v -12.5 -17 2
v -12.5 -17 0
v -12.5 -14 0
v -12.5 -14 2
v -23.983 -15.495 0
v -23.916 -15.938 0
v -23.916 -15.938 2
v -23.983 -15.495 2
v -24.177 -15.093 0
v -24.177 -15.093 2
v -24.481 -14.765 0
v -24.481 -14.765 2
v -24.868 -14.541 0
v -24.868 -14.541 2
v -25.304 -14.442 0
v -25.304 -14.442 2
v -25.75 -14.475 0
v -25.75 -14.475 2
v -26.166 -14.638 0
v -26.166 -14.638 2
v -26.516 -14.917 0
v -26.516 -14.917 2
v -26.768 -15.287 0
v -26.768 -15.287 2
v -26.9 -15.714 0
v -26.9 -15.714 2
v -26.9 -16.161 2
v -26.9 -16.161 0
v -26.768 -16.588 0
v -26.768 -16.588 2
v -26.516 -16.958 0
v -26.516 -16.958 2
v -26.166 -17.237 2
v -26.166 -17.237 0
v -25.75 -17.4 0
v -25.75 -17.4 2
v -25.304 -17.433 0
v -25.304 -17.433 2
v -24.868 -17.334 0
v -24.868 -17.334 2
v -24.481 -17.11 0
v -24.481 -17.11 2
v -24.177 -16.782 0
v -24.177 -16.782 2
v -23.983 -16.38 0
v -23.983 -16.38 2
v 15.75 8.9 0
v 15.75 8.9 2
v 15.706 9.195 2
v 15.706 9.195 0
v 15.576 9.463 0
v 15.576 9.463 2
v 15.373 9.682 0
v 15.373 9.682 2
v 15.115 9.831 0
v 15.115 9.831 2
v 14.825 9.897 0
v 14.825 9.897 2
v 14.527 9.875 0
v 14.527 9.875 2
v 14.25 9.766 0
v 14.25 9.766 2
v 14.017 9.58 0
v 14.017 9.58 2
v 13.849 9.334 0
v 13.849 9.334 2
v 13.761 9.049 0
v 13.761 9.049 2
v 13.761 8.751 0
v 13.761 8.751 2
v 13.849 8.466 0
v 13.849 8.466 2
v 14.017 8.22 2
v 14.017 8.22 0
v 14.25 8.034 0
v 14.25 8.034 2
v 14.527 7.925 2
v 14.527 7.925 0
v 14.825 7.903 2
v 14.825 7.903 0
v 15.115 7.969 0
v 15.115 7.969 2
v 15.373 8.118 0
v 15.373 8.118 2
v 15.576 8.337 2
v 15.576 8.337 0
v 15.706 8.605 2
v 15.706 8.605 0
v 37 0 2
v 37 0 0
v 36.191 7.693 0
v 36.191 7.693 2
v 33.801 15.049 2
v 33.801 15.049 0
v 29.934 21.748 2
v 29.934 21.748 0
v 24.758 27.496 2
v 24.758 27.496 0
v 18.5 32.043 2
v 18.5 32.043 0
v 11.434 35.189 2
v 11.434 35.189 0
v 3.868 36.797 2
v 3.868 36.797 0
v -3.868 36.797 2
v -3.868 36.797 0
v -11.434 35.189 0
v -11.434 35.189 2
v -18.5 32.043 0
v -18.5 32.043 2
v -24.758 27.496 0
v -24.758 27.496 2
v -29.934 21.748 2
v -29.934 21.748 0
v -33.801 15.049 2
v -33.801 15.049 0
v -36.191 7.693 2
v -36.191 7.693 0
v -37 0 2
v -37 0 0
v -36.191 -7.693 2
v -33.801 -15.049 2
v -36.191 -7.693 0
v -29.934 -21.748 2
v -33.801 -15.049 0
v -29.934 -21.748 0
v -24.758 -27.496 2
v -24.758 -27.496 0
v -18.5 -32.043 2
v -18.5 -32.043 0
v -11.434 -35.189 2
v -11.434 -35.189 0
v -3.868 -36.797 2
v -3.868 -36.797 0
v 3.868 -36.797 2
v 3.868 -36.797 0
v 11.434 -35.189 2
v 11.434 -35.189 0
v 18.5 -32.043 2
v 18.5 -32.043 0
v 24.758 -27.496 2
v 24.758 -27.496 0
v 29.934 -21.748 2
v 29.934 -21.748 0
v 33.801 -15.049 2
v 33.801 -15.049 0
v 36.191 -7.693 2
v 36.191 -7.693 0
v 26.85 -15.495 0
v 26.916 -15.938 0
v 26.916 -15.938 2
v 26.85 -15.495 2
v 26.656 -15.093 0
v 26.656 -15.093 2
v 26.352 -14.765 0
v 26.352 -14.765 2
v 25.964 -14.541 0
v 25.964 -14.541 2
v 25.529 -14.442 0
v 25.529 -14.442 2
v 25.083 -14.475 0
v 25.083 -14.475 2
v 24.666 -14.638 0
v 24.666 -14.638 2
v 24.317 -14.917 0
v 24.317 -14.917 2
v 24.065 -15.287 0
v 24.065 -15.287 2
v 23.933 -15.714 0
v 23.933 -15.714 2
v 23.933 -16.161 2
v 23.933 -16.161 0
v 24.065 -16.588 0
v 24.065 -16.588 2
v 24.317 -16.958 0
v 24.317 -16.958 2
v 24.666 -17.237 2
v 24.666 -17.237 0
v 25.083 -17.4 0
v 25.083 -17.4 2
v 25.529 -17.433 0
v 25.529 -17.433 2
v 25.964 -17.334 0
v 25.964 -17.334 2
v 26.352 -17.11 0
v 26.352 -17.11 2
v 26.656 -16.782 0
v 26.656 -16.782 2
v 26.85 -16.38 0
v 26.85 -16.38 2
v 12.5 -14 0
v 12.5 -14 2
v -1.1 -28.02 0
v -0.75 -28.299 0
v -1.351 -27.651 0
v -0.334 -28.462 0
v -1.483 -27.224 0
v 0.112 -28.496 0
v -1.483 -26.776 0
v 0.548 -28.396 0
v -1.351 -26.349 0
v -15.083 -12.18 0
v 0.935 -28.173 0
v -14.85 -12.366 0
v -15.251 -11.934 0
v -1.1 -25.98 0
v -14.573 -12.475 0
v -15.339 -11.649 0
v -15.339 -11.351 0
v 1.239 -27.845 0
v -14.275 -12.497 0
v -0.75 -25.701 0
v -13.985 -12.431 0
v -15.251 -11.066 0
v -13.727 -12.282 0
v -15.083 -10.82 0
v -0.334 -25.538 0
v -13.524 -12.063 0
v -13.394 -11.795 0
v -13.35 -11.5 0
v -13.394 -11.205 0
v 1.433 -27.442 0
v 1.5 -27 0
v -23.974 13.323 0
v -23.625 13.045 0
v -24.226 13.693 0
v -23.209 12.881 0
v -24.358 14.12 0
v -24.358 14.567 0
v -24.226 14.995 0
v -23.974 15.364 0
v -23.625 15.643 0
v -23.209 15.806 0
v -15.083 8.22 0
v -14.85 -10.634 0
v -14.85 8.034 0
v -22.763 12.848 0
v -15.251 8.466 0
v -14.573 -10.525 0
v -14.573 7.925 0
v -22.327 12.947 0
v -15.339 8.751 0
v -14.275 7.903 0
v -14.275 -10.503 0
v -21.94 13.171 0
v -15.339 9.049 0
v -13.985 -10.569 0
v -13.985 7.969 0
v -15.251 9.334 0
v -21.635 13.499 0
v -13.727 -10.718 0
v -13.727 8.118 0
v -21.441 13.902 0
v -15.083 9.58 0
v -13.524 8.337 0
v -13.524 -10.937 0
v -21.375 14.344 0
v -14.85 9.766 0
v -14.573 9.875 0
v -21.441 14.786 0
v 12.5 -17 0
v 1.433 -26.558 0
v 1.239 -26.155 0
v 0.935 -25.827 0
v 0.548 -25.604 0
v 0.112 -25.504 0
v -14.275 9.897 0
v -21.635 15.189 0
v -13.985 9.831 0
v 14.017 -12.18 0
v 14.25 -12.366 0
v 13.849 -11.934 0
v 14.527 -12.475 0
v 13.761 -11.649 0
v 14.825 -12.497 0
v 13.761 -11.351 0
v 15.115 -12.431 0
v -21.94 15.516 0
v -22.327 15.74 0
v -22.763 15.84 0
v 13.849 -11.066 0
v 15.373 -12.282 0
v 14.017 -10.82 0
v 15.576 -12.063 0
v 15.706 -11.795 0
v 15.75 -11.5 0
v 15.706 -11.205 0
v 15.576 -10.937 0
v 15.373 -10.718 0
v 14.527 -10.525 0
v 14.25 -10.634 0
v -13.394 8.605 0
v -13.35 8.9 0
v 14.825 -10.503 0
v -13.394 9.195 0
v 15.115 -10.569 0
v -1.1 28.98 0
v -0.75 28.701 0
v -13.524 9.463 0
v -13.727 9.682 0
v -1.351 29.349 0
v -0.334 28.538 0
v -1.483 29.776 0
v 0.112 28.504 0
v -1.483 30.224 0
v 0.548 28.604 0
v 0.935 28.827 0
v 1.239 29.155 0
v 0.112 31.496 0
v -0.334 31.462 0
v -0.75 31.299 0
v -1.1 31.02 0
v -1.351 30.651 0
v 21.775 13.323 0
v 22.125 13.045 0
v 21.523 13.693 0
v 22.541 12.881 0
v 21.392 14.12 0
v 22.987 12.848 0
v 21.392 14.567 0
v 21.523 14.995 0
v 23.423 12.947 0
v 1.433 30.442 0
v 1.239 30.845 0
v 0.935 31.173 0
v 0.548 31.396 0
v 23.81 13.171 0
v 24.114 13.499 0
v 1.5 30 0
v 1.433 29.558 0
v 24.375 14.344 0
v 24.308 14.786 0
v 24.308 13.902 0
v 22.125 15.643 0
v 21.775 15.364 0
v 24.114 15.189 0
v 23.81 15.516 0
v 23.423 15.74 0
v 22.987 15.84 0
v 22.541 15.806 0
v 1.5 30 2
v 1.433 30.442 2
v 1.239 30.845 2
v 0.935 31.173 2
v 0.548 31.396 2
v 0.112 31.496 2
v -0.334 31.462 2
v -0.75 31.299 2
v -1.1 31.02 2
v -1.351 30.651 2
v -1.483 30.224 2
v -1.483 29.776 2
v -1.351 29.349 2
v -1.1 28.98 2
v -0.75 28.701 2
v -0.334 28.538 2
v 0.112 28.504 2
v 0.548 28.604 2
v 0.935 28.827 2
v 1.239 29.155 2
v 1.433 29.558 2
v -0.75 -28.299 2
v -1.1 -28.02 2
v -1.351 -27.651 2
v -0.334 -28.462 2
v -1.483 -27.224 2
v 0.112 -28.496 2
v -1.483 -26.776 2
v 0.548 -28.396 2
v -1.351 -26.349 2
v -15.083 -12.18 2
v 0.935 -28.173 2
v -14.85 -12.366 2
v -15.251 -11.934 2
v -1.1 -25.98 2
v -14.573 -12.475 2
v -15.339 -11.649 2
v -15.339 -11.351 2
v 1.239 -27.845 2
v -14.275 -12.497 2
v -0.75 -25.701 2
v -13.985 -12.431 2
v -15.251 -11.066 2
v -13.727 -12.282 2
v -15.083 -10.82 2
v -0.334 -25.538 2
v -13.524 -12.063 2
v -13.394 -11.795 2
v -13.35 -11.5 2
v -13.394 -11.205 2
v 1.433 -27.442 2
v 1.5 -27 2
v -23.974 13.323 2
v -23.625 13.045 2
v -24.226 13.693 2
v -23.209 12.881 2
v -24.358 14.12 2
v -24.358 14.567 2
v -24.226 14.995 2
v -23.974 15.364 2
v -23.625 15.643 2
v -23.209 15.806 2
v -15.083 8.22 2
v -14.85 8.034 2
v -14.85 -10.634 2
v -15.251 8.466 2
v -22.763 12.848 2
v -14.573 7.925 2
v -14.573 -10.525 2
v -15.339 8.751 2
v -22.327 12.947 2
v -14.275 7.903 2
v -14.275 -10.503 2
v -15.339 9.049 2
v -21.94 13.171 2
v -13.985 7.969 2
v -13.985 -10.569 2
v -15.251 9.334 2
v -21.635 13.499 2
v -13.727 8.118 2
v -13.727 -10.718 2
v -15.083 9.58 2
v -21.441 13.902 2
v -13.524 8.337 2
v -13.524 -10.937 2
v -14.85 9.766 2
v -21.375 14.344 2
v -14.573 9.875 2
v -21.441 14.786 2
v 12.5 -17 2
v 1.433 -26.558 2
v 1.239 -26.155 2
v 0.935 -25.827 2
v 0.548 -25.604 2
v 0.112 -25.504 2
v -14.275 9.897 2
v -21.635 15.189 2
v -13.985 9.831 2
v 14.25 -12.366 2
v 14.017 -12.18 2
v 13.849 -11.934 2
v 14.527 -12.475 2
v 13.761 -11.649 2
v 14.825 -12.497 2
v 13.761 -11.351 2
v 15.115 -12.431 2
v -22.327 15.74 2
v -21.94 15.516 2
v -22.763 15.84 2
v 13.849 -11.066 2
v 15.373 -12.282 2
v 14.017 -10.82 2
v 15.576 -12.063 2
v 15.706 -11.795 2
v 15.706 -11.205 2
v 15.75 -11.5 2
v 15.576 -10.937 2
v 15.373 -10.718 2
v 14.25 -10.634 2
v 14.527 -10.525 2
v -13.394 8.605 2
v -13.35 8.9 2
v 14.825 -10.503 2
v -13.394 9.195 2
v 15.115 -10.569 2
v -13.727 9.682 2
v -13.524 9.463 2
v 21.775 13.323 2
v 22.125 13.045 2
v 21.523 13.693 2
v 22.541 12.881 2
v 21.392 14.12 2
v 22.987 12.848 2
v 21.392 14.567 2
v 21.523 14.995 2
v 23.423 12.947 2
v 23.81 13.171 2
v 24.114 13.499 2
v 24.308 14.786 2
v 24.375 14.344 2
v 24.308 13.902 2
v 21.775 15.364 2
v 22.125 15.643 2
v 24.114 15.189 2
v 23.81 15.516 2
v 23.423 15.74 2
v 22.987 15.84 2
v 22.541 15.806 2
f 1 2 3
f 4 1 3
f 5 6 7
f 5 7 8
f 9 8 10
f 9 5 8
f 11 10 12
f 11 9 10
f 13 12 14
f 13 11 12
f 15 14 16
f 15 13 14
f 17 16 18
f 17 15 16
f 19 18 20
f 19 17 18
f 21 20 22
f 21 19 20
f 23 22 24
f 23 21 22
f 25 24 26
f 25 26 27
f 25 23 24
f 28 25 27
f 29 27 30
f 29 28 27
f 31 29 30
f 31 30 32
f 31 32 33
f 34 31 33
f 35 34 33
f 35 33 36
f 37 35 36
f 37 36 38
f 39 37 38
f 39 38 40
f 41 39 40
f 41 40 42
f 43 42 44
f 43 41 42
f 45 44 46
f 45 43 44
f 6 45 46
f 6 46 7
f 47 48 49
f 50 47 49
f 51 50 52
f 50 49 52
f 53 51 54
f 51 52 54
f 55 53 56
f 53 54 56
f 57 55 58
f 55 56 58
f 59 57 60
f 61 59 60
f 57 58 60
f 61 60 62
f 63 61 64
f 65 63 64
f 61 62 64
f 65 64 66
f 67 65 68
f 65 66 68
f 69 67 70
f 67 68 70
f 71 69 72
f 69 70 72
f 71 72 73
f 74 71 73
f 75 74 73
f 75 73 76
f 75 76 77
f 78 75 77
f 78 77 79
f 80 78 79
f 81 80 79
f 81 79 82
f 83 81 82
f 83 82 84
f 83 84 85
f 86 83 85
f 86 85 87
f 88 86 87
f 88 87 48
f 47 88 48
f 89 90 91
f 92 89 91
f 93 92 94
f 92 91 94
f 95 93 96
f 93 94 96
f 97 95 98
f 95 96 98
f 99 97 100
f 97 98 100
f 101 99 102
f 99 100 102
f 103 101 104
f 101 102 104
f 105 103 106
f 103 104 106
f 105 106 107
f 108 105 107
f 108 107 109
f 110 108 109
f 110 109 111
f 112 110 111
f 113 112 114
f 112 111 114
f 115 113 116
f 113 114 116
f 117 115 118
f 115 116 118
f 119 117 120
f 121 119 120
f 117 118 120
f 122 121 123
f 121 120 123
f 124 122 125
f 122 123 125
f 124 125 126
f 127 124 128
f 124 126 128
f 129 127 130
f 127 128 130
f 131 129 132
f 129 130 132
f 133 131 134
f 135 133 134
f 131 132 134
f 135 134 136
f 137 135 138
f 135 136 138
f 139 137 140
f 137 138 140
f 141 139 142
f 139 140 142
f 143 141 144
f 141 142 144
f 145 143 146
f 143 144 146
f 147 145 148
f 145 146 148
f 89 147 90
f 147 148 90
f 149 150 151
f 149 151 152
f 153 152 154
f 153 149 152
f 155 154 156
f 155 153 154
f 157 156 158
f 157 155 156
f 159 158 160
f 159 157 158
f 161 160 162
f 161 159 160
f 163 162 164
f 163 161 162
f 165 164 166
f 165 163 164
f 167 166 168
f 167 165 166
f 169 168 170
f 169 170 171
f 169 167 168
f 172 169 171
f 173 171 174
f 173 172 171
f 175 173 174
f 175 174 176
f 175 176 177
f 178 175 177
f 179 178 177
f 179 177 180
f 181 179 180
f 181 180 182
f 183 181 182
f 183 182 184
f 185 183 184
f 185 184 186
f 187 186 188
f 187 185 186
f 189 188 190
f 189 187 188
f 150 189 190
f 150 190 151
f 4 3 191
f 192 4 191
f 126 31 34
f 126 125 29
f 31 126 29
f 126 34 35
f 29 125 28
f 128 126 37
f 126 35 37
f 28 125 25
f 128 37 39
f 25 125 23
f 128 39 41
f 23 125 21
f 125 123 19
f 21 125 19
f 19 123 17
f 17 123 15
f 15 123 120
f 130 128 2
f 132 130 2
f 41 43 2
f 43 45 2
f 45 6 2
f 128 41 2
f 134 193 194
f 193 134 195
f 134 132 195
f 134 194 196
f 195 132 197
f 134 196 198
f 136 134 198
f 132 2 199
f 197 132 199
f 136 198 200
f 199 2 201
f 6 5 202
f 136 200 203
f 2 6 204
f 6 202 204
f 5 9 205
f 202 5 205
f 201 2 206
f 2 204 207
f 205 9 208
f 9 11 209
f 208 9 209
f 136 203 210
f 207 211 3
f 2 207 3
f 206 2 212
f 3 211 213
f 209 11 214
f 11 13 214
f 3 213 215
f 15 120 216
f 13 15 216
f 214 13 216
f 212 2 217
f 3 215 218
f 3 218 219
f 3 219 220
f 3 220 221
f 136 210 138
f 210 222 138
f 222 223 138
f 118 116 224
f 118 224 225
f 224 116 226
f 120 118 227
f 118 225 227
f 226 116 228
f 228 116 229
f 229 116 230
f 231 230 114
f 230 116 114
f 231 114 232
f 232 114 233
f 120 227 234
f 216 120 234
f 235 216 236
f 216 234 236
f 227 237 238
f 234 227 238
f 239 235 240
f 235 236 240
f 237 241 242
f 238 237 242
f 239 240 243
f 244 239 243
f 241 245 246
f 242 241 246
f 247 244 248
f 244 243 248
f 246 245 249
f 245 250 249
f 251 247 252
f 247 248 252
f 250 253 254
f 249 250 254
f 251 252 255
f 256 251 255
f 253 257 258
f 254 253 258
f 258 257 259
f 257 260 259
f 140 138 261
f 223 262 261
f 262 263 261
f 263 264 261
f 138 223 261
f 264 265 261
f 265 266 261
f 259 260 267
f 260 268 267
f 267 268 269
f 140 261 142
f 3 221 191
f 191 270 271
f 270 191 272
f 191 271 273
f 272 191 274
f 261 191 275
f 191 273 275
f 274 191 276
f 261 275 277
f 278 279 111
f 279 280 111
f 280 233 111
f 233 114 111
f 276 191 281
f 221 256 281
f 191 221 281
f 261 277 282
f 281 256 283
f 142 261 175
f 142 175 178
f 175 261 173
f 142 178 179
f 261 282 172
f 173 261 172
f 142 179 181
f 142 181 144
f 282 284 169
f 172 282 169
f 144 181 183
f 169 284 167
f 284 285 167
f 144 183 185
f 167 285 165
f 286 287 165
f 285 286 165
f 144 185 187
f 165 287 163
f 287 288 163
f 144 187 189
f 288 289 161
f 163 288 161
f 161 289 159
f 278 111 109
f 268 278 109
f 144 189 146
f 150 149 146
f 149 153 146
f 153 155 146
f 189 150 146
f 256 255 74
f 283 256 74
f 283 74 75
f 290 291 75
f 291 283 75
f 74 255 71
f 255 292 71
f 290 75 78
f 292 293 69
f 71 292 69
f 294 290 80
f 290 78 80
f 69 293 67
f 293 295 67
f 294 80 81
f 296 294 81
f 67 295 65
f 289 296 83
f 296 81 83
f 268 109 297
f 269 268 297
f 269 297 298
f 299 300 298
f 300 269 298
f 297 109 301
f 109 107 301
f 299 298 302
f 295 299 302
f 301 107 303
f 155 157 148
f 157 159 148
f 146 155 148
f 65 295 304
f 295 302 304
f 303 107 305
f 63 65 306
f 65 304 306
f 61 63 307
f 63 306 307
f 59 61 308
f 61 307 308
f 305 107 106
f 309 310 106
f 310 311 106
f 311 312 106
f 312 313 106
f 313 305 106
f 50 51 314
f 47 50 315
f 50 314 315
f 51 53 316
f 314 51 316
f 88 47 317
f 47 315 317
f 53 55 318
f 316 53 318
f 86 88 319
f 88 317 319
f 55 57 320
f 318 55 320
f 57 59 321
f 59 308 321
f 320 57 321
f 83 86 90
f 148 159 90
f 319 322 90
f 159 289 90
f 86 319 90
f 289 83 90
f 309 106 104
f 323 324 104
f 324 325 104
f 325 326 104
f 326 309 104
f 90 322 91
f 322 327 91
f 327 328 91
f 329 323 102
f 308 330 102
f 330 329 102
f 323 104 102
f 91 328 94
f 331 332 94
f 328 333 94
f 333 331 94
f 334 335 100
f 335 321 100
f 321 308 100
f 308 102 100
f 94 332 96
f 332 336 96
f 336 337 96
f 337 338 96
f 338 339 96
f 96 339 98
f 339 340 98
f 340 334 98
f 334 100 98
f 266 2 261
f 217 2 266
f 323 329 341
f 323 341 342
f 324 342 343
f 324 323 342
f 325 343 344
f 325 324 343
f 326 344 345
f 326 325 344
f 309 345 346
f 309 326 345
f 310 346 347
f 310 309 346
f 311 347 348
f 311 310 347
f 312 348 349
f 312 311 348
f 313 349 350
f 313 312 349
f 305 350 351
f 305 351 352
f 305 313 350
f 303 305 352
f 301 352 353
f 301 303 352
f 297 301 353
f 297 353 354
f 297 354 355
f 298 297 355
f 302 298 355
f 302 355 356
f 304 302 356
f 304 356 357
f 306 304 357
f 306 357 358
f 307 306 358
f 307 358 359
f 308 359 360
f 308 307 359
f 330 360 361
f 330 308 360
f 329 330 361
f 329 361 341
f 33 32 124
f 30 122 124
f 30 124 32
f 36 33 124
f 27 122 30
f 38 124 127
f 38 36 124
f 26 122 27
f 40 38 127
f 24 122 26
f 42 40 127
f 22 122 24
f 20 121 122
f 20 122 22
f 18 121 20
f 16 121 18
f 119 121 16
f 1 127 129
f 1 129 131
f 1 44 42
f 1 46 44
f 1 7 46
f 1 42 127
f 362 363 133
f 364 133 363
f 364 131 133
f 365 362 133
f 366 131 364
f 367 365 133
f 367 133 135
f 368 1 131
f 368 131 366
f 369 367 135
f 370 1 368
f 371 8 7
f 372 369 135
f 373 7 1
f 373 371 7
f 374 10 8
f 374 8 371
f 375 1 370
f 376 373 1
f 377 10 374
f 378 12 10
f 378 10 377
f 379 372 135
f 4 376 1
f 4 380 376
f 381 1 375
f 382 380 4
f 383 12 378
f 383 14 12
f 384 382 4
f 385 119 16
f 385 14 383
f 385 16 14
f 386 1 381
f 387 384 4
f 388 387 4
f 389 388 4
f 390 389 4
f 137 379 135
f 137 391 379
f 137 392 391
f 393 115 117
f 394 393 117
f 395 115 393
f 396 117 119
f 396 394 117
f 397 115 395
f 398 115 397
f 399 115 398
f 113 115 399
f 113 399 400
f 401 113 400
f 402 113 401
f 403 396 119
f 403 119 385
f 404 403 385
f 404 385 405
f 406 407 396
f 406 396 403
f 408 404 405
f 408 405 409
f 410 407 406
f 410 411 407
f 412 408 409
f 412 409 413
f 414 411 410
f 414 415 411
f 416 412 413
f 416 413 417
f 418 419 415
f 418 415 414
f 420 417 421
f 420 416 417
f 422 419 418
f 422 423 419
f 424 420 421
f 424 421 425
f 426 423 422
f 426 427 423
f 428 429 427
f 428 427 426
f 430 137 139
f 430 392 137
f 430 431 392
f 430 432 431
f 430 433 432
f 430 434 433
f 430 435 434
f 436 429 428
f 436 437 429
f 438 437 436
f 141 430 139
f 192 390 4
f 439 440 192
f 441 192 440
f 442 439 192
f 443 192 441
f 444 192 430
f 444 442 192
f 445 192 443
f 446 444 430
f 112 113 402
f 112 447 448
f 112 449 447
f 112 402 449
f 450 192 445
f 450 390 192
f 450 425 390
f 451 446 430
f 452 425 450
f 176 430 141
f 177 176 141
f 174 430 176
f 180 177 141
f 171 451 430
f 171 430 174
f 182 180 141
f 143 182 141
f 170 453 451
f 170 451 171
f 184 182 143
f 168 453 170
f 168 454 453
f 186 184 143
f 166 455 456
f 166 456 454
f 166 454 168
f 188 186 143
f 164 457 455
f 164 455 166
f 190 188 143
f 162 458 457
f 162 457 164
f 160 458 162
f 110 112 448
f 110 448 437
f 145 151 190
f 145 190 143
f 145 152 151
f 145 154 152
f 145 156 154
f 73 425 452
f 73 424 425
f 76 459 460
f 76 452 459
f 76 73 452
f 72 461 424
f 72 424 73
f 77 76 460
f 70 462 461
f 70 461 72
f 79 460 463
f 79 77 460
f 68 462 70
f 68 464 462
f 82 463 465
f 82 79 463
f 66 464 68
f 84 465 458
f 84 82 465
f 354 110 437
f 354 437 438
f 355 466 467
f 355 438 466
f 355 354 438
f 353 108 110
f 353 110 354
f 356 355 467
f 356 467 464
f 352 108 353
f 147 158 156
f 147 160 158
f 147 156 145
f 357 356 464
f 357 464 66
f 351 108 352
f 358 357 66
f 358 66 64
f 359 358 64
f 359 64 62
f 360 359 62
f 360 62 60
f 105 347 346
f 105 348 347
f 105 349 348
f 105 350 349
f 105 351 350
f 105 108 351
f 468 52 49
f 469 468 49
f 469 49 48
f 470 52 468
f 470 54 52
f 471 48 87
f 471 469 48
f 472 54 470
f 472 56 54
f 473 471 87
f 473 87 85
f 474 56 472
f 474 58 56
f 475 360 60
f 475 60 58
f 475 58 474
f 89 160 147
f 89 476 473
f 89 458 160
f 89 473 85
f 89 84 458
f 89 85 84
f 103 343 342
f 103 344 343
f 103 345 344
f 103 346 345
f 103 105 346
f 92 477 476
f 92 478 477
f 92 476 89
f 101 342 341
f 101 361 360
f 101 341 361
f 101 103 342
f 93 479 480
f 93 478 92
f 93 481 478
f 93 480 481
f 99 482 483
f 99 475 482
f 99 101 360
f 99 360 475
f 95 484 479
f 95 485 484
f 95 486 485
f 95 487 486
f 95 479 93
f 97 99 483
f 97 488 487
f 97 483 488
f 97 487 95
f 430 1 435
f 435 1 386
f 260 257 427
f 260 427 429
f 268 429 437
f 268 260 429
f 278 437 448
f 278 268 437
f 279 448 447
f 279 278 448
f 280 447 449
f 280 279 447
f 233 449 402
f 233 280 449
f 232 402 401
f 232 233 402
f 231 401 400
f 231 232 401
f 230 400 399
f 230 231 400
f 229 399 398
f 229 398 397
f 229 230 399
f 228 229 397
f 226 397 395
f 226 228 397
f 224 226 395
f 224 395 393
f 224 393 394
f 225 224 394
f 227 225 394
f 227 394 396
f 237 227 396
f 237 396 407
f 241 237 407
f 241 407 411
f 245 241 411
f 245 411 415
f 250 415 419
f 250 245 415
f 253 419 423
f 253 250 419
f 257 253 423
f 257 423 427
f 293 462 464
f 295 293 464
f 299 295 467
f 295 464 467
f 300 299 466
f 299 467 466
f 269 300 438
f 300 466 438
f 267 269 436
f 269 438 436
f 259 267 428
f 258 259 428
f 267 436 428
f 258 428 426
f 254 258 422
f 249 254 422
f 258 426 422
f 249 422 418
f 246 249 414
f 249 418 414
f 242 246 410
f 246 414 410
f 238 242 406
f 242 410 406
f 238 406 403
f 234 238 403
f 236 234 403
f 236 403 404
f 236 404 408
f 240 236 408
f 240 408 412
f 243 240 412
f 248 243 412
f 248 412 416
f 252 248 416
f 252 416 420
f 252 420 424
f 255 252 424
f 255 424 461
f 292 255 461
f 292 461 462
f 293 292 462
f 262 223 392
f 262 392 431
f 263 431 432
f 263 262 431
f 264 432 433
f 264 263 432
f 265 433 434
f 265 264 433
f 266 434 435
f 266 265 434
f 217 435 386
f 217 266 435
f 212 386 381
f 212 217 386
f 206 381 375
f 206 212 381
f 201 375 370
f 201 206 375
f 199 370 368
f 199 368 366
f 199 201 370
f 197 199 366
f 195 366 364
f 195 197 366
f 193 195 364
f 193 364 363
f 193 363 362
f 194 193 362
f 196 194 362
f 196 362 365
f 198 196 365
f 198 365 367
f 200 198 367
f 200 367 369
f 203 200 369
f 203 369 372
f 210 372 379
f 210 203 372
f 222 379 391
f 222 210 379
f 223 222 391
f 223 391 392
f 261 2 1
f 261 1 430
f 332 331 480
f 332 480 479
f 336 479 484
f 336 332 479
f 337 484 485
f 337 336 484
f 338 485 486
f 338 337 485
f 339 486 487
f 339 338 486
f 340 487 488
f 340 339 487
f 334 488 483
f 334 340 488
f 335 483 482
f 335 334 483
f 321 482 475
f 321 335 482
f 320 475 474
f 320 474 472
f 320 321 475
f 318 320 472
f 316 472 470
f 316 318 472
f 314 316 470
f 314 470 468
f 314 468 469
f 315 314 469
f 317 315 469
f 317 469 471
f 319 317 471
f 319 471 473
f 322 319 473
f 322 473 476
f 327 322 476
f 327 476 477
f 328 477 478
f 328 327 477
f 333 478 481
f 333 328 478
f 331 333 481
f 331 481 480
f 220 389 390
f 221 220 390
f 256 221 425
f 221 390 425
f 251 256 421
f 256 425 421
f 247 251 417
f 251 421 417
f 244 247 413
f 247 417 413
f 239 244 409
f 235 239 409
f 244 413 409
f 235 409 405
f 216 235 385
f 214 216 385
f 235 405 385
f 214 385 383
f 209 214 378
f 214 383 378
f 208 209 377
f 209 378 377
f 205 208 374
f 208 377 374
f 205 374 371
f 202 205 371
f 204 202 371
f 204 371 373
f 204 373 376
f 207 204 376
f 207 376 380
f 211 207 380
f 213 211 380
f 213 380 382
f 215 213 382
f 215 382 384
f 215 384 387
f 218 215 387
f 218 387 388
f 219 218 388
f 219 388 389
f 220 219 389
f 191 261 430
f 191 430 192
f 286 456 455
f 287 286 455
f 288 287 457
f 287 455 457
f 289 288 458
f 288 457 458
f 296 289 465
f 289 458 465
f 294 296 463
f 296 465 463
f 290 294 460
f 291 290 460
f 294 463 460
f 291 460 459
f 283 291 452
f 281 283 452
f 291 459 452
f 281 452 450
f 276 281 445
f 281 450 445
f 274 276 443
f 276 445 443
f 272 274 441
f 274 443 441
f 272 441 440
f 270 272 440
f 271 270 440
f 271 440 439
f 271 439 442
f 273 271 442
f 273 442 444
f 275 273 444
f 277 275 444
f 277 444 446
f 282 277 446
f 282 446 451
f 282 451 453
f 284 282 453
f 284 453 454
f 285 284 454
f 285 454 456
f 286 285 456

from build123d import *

# Parameters (mm, degrees)
ESQUISSE1_R             = 37
ESQUISSE1_R_2           = 1.5
ESQUISSE1_W             = 25
ESQUISSE1_H             = 3
BOSS_EXTRU_1_DEPTH      = 2
BOSS_EXTRU_2_DEPTH      = 15
ESQUISSE3_W             = 2
ESQUISSE3_H             = 28.4
BOSS_EXTRU_3_DEPTH      = 2.25
ESQUISSE5_W             = 2
ESQUISSE5_H             = 24.4
BOSS_EXTRU_4_DEPTH      = 2.25
ESQUISSE7_W             = 33.1
ESQUISSE7_H             = 28.4
BOSS_EXTRU_5_DEPTH      = 1
ESQUISSE8_W             = 15
ESQUISSE8_H             = 15
ENL_V_MAT_EXTRU_1_DEPTH = 3
ESQUISSE9_W             = 21
ESQUISSE9_H             = 2.5
ENL_V_MAT_EXTRU_2_DEPTH = 3
ESQUISSE10_R            = 1
ENL_V_MAT_EXTRU_3_DEPTH = 19
ESQUISSE11_W            = 33.1
ESQUISSE11_H            = 28.4
ENL_V_MAT_EXTRU_4_DEPTH = 15


with BuildPart() as part:
    # Esquisse1 → Boss.-Extru.1 (new body)
    with BuildSketch(Plane.XY):
        Circle(ESQUISSE1_R)
        with Locations((0, 30)):
            Circle(ESQUISSE1_R_2, mode=Mode.SUBTRACT)
        with Locations((-22.874807889, 14.34375)):
            Circle(ESQUISSE1_R_2, mode=Mode.SUBTRACT)
        with Locations((-25.416453209, -15.9375)):
            Circle(ESQUISSE1_R_2, mode=Mode.SUBTRACT)
        with Locations((0, -27)):
            Circle(ESQUISSE1_R_2, mode=Mode.SUBTRACT)
        with Locations((25.416453209, -15.9375)):
            Circle(ESQUISSE1_R_2, mode=Mode.SUBTRACT)
        with Locations((22.874807889, 14.34375)):
            Circle(ESQUISSE1_R_2, mode=Mode.SUBTRACT)
        with Locations((0, -15.5)):
            Rectangle(ESQUISSE1_W, ESQUISSE1_H, mode=Mode.SUBTRACT)
    extrude(amount=BOSS_EXTRU_1_DEPTH)

    # Esquisse2 → Boss.-Extru.2 (add)
    with BuildSketch(Plane(origin=(0, 0, 0), x_dir=(-1, 0, 0), z_dir=(0, 0, -1))):
        Polygon((-16.75, 14.9), (-12.75, 14.9), (-12.75, -9.5), (12.35, -9.5), (12.35, 14.9), (16.35, 14.9), (16.35, -13.5), (-16.75, -13.5), align=None)
    extrude(amount=BOSS_EXTRU_2_DEPTH)

    # Esquisse3 → Boss.-Extru.3 (add)
    with BuildSketch(Plane(origin=(-12.35, 0, 0), x_dir=(0, 0, -1), z_dir=(1, 0, 0))):
        with Locations((9.625, 0.7)):
            Rectangle(ESQUISSE3_W, ESQUISSE3_H)
        with Locations((6.625, 0.7)):
            Rectangle(ESQUISSE3_W, ESQUISSE3_H)
    extrude(amount=BOSS_EXTRU_3_DEPTH)

    # Esquisse5 → Boss.-Extru.4 (add)
    with BuildSketch(Plane.ZY.offset(-12.75)):
        with Locations((-9.625, 2.7)):
            Rectangle(ESQUISSE5_W, ESQUISSE5_H)
        with Locations((-6.625, 2.7)):
            Rectangle(ESQUISSE5_W, ESQUISSE5_H)
    extrude(amount=BOSS_EXTRU_4_DEPTH)

    # Esquisse7 → Boss.-Extru.5 (add)
    with BuildSketch(Plane(origin=(0, 0, -15), x_dir=(-1, 0, 0), z_dir=(0, 0, -1))):
        with Locations((-0.2, 0.7)):
            Rectangle(ESQUISSE7_W, ESQUISSE7_H)
    extrude(amount=-BOSS_EXTRU_5_DEPTH)

    # Esquisse8 → Enlèv. mat.-Extru.1 (cut)
    with BuildSketch(Plane(origin=(0, 0, -15), x_dir=(-1, 0, 0), z_dir=(0, 0, -1))):
        Rectangle(ESQUISSE8_W, ESQUISSE8_H)
    extrude(amount=-ENL_V_MAT_EXTRU_1_DEPTH, mode=Mode.SUBTRACT)

    # Esquisse9 → Enlèv. mat.-Extru.2 (cut)
    with BuildSketch(Plane.XZ.offset(13.5)):
        with Locations((0, -5.65)):
            Rectangle(ESQUISSE9_W, ESQUISSE9_H)
    extrude(amount=-ENL_V_MAT_EXTRU_2_DEPTH, mode=Mode.SUBTRACT)

    # Esquisse10 → Enlèv. mat.-Extru.3 (cut)
    with BuildSketch(Plane.XY.offset(2)):
        with Locations((-14.35, 8.9)):
            Circle(ESQUISSE10_R)
        with Locations((-14.35, -11.5)):
            Circle(ESQUISSE10_R)
        with Locations((14.75, -11.5)):
            Circle(ESQUISSE10_R)
        with Locations((14.75, 8.9)):
            Circle(ESQUISSE10_R)
    extrude(amount=-ENL_V_MAT_EXTRU_3_DEPTH, mode=Mode.SUBTRACT)

    # Esquisse11 → Enlèv. mat.-Extru.4 (cut)
    with BuildSketch(Plane(origin=(0, 0, -15), x_dir=(-1, 0, 0), z_dir=(0, 0, -1))):
        with Locations((-0.2, 0.7)):
            Rectangle(ESQUISSE11_W, ESQUISSE11_H)
    extrude(amount=-ENL_V_MAT_EXTRU_4_DEPTH, mode=Mode.SUBTRACT)


solid = part.part
